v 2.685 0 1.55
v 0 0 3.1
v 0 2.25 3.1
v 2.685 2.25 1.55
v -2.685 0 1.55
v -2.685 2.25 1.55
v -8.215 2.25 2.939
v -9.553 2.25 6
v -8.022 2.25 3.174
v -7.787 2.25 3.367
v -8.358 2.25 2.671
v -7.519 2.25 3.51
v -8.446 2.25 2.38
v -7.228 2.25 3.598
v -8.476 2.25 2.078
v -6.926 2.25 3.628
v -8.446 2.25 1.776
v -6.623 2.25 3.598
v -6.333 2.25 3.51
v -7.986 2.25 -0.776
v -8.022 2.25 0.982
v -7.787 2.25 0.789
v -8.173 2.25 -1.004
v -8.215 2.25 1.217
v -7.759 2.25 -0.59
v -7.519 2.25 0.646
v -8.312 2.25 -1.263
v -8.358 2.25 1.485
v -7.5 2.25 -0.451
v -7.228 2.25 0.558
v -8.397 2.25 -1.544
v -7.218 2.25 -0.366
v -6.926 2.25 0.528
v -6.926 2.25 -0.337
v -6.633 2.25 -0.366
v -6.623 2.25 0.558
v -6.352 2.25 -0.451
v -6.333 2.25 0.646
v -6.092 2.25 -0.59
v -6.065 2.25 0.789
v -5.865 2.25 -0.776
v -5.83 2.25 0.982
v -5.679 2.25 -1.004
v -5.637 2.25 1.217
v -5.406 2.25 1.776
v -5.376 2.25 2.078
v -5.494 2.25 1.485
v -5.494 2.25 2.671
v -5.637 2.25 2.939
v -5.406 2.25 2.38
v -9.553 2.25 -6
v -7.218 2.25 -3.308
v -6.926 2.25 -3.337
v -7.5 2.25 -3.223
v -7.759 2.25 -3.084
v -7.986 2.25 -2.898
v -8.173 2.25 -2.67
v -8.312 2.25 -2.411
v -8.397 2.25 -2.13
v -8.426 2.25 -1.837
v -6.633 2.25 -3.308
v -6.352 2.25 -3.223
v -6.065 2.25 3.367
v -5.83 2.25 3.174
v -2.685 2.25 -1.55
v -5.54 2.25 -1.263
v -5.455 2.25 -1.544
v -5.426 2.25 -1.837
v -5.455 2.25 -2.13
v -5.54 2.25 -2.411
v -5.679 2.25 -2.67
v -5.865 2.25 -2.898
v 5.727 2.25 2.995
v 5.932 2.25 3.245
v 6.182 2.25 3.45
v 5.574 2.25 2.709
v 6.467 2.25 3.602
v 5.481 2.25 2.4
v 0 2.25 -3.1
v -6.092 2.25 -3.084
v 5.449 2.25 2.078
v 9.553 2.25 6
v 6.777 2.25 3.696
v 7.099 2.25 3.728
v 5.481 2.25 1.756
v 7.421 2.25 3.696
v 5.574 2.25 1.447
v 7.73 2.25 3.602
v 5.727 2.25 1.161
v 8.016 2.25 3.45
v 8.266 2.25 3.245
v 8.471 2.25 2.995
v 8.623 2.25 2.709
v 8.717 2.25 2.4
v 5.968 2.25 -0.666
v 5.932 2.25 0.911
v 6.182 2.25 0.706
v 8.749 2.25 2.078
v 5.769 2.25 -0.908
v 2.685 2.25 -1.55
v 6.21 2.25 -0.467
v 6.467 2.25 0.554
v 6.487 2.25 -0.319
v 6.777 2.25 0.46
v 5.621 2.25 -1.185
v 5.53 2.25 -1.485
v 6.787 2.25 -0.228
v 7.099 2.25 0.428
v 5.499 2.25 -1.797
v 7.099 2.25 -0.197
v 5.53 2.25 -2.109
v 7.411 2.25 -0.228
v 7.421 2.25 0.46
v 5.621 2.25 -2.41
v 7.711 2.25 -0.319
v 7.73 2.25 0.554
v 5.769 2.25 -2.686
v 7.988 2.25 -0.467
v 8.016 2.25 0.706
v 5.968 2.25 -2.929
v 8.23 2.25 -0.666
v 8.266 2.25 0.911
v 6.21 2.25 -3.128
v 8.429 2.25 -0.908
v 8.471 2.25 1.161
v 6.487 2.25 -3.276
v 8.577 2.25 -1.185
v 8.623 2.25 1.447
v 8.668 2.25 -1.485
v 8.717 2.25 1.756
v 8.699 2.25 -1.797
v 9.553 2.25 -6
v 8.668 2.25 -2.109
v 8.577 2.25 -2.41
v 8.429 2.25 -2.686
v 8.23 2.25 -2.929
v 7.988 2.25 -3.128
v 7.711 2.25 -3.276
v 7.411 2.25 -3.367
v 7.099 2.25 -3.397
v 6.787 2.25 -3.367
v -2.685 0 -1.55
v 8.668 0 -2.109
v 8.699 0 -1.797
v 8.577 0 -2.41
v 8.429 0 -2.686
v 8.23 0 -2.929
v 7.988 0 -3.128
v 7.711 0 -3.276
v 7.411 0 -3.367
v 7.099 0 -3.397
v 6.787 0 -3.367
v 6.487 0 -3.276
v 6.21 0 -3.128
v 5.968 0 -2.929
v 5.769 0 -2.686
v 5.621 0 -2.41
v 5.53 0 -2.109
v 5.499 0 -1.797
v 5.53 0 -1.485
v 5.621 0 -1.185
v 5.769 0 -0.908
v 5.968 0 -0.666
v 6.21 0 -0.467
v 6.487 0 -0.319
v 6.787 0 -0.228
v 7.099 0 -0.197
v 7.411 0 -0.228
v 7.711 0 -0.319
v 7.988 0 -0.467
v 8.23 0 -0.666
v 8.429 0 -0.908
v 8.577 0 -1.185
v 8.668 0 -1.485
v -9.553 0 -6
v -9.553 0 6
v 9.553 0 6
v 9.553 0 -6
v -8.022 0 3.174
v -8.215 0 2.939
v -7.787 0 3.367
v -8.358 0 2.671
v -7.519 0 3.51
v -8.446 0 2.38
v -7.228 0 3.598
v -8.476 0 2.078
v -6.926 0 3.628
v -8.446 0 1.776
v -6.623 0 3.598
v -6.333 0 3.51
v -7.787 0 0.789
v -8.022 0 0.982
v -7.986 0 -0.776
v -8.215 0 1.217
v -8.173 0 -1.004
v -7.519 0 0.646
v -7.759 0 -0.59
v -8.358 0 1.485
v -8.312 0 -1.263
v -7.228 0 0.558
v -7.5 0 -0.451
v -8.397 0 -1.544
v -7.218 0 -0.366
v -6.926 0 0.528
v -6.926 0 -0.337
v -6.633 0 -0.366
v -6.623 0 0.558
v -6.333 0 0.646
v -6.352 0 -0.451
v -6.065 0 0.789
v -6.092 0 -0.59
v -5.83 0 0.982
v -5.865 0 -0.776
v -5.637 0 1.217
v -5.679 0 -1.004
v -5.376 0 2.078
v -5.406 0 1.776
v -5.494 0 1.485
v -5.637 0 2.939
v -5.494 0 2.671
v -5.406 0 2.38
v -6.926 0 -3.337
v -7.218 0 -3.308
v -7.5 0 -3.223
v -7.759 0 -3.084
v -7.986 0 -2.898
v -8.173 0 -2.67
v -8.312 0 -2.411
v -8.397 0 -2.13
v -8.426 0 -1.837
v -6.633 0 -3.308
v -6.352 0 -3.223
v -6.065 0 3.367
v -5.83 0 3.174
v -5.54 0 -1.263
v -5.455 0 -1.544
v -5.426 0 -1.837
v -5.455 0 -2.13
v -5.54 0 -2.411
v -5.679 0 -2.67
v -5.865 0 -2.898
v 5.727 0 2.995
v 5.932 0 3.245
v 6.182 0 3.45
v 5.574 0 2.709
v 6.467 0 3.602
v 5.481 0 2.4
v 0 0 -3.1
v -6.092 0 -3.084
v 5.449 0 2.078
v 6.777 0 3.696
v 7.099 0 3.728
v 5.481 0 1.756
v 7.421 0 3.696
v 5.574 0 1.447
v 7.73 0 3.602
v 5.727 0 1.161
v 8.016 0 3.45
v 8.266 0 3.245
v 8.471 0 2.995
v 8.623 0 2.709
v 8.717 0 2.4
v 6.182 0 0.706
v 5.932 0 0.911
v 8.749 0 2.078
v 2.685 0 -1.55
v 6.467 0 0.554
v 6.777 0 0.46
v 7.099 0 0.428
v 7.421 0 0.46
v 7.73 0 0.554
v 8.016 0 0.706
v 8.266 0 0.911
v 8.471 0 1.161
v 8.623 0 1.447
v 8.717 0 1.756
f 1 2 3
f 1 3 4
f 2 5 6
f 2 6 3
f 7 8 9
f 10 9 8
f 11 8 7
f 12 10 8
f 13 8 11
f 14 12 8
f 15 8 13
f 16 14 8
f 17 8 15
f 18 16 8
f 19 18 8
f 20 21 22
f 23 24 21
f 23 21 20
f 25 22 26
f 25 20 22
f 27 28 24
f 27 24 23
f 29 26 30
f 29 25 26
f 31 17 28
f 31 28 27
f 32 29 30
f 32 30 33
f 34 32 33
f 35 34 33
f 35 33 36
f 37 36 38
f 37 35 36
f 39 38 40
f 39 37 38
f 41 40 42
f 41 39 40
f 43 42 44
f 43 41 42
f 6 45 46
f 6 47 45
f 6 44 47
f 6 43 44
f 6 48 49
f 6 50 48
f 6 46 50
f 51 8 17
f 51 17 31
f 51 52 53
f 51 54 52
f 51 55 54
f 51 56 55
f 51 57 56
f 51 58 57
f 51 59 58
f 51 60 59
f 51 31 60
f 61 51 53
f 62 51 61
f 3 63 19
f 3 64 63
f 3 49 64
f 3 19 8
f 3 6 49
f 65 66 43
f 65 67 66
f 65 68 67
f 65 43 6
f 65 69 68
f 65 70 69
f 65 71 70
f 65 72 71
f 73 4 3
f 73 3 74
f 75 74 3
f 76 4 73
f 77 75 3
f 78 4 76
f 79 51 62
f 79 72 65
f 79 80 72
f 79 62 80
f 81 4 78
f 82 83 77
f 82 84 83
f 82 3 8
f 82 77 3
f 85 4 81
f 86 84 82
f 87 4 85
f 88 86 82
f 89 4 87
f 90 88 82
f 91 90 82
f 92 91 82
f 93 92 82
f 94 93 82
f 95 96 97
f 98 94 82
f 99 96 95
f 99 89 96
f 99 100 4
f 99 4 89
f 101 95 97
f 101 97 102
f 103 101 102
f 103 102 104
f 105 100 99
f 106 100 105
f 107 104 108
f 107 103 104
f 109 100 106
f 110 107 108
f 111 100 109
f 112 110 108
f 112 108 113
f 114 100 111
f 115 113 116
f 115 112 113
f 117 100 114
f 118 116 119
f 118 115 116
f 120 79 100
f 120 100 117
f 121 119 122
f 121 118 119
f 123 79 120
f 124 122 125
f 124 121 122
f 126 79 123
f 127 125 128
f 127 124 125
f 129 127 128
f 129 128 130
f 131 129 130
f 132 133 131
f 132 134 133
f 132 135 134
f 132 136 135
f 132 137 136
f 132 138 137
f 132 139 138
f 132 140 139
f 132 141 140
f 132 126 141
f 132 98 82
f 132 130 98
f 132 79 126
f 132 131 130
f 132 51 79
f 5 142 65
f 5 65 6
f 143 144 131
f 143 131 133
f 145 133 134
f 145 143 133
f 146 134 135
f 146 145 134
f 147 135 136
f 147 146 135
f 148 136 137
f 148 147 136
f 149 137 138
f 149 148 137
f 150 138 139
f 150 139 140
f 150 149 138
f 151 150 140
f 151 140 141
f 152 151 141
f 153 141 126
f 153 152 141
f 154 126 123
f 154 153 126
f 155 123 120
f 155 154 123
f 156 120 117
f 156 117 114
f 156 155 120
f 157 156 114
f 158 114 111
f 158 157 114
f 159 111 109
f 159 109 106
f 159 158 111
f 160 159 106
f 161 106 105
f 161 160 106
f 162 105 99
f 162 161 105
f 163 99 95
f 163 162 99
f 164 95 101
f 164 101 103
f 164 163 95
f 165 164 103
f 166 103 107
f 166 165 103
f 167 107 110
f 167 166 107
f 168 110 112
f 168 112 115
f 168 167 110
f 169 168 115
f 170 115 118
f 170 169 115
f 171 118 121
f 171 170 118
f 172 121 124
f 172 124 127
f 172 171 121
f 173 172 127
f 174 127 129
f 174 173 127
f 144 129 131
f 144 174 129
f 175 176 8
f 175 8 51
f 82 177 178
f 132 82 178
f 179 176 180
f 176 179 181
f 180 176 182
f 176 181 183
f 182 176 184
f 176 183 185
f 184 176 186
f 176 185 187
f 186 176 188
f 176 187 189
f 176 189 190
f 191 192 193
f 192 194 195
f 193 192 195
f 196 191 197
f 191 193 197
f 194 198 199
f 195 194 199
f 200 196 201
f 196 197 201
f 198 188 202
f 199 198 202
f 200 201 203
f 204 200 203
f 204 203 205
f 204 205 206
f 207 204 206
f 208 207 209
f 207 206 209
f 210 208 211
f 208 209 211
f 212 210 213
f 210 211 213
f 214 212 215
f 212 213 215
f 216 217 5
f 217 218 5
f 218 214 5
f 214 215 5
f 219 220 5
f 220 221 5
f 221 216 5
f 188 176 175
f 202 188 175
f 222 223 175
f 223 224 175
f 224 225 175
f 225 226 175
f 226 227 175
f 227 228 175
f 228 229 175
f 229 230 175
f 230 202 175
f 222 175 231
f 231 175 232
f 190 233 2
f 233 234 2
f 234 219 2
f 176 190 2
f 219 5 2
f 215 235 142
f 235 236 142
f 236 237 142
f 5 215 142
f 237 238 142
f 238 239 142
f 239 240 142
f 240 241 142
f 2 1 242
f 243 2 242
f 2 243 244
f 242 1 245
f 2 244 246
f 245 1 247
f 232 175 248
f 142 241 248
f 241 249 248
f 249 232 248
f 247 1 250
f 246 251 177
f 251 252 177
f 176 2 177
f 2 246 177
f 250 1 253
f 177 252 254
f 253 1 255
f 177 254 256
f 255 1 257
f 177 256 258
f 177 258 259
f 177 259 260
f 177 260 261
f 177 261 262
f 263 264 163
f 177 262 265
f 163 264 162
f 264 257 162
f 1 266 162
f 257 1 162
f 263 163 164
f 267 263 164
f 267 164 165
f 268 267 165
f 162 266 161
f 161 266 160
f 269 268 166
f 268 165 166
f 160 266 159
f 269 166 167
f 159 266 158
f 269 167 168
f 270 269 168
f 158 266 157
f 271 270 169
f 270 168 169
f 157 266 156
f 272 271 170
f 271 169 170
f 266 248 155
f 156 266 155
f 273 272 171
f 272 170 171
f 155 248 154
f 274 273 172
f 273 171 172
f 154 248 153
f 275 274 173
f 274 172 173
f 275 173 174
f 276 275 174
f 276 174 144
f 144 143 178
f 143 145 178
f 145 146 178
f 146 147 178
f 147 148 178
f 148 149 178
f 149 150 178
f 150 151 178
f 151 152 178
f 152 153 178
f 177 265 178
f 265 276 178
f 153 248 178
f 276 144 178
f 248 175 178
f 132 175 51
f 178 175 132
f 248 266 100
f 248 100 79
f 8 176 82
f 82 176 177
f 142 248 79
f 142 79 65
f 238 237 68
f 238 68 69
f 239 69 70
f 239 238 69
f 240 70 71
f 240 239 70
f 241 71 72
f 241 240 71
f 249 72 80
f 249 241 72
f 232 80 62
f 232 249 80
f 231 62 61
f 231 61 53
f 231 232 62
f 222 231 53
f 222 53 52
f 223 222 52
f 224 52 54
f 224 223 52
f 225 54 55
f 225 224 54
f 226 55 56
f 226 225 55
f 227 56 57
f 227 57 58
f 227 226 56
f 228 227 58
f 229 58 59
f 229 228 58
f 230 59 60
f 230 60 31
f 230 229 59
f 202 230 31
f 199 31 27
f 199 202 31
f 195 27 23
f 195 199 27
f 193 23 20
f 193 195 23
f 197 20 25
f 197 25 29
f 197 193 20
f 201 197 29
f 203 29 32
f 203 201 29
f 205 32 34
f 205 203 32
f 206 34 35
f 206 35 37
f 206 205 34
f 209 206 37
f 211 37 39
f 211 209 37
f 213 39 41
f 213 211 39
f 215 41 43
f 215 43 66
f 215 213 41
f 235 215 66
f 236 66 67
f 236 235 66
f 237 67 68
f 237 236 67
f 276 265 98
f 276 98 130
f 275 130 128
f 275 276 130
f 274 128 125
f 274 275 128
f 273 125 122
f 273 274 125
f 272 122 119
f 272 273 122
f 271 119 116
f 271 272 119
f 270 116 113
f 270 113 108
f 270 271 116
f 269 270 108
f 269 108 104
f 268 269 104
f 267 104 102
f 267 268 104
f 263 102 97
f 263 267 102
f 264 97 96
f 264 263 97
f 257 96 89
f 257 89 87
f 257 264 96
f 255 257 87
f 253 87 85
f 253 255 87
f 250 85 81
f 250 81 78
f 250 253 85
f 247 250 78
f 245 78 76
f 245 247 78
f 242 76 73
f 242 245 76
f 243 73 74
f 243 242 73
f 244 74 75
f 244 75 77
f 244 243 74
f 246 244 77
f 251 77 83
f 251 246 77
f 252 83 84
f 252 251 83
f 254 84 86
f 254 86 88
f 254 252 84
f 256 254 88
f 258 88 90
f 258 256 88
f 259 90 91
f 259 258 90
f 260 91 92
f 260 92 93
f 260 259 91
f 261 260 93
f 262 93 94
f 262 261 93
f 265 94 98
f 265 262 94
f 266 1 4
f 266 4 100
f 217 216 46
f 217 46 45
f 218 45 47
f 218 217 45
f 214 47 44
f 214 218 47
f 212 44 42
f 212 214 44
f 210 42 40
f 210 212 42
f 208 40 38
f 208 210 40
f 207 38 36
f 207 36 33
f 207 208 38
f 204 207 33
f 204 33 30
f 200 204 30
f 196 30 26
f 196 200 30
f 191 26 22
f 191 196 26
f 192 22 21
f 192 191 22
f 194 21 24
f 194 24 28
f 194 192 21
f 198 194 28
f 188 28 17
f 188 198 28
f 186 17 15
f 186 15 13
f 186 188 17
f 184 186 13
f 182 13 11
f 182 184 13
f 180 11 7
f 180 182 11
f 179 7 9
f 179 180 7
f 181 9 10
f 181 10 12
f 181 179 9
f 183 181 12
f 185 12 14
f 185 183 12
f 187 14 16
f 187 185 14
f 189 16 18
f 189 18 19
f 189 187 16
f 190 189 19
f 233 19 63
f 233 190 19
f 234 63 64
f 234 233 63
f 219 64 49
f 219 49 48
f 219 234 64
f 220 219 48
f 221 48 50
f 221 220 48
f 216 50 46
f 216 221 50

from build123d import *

# Parameters (mm, degrees)
SKETCH1_W           = 19.106827842
SKETCH1_H           = 12
SKETCH1_R           = 1.5
SKETCH1_R_2         = 1.6
SKETCH1_R_3         = 1.65
SKETCH1_R_4         = 1.55
BOSS_EXTRUDE1_DEPTH = 2.25


with BuildPart() as part:
    # Sketch1 → Boss-Extrude1 (new body)
    with BuildSketch(Plane(origin=(0, 0, 0), x_dir=(1, 0, 0), z_dir=(0, 1, 0))):
        Rectangle(SKETCH1_W, SKETCH1_H)
        with Locations((-6.925755231, 1.836983108)):
            Circle(SKETCH1_R, mode=Mode.SUBTRACT)
        with Locations((7.098878727, 1.797303867)):
            Circle(SKETCH1_R_2, mode=Mode.SUBTRACT)
        with Locations((7.098878727, -2.077930101)):
            Circle(SKETCH1_R_3, mode=Mode.SUBTRACT)
        with Locations((-6.925755231, -2.077930101)):
            Circle(SKETCH1_R_4, mode=Mode.SUBTRACT)
        Polygon((2.685, 1.550185473), (0, 3.100370946), (-2.685, 1.550185473), (-2.685, -1.550185473), (0, -3.100370946), (2.685, -1.550185473), align=None, mode=Mode.SUBTRACT)
    extrude(amount=BOSS_EXTRUDE1_DEPTH)


solid = part.part
